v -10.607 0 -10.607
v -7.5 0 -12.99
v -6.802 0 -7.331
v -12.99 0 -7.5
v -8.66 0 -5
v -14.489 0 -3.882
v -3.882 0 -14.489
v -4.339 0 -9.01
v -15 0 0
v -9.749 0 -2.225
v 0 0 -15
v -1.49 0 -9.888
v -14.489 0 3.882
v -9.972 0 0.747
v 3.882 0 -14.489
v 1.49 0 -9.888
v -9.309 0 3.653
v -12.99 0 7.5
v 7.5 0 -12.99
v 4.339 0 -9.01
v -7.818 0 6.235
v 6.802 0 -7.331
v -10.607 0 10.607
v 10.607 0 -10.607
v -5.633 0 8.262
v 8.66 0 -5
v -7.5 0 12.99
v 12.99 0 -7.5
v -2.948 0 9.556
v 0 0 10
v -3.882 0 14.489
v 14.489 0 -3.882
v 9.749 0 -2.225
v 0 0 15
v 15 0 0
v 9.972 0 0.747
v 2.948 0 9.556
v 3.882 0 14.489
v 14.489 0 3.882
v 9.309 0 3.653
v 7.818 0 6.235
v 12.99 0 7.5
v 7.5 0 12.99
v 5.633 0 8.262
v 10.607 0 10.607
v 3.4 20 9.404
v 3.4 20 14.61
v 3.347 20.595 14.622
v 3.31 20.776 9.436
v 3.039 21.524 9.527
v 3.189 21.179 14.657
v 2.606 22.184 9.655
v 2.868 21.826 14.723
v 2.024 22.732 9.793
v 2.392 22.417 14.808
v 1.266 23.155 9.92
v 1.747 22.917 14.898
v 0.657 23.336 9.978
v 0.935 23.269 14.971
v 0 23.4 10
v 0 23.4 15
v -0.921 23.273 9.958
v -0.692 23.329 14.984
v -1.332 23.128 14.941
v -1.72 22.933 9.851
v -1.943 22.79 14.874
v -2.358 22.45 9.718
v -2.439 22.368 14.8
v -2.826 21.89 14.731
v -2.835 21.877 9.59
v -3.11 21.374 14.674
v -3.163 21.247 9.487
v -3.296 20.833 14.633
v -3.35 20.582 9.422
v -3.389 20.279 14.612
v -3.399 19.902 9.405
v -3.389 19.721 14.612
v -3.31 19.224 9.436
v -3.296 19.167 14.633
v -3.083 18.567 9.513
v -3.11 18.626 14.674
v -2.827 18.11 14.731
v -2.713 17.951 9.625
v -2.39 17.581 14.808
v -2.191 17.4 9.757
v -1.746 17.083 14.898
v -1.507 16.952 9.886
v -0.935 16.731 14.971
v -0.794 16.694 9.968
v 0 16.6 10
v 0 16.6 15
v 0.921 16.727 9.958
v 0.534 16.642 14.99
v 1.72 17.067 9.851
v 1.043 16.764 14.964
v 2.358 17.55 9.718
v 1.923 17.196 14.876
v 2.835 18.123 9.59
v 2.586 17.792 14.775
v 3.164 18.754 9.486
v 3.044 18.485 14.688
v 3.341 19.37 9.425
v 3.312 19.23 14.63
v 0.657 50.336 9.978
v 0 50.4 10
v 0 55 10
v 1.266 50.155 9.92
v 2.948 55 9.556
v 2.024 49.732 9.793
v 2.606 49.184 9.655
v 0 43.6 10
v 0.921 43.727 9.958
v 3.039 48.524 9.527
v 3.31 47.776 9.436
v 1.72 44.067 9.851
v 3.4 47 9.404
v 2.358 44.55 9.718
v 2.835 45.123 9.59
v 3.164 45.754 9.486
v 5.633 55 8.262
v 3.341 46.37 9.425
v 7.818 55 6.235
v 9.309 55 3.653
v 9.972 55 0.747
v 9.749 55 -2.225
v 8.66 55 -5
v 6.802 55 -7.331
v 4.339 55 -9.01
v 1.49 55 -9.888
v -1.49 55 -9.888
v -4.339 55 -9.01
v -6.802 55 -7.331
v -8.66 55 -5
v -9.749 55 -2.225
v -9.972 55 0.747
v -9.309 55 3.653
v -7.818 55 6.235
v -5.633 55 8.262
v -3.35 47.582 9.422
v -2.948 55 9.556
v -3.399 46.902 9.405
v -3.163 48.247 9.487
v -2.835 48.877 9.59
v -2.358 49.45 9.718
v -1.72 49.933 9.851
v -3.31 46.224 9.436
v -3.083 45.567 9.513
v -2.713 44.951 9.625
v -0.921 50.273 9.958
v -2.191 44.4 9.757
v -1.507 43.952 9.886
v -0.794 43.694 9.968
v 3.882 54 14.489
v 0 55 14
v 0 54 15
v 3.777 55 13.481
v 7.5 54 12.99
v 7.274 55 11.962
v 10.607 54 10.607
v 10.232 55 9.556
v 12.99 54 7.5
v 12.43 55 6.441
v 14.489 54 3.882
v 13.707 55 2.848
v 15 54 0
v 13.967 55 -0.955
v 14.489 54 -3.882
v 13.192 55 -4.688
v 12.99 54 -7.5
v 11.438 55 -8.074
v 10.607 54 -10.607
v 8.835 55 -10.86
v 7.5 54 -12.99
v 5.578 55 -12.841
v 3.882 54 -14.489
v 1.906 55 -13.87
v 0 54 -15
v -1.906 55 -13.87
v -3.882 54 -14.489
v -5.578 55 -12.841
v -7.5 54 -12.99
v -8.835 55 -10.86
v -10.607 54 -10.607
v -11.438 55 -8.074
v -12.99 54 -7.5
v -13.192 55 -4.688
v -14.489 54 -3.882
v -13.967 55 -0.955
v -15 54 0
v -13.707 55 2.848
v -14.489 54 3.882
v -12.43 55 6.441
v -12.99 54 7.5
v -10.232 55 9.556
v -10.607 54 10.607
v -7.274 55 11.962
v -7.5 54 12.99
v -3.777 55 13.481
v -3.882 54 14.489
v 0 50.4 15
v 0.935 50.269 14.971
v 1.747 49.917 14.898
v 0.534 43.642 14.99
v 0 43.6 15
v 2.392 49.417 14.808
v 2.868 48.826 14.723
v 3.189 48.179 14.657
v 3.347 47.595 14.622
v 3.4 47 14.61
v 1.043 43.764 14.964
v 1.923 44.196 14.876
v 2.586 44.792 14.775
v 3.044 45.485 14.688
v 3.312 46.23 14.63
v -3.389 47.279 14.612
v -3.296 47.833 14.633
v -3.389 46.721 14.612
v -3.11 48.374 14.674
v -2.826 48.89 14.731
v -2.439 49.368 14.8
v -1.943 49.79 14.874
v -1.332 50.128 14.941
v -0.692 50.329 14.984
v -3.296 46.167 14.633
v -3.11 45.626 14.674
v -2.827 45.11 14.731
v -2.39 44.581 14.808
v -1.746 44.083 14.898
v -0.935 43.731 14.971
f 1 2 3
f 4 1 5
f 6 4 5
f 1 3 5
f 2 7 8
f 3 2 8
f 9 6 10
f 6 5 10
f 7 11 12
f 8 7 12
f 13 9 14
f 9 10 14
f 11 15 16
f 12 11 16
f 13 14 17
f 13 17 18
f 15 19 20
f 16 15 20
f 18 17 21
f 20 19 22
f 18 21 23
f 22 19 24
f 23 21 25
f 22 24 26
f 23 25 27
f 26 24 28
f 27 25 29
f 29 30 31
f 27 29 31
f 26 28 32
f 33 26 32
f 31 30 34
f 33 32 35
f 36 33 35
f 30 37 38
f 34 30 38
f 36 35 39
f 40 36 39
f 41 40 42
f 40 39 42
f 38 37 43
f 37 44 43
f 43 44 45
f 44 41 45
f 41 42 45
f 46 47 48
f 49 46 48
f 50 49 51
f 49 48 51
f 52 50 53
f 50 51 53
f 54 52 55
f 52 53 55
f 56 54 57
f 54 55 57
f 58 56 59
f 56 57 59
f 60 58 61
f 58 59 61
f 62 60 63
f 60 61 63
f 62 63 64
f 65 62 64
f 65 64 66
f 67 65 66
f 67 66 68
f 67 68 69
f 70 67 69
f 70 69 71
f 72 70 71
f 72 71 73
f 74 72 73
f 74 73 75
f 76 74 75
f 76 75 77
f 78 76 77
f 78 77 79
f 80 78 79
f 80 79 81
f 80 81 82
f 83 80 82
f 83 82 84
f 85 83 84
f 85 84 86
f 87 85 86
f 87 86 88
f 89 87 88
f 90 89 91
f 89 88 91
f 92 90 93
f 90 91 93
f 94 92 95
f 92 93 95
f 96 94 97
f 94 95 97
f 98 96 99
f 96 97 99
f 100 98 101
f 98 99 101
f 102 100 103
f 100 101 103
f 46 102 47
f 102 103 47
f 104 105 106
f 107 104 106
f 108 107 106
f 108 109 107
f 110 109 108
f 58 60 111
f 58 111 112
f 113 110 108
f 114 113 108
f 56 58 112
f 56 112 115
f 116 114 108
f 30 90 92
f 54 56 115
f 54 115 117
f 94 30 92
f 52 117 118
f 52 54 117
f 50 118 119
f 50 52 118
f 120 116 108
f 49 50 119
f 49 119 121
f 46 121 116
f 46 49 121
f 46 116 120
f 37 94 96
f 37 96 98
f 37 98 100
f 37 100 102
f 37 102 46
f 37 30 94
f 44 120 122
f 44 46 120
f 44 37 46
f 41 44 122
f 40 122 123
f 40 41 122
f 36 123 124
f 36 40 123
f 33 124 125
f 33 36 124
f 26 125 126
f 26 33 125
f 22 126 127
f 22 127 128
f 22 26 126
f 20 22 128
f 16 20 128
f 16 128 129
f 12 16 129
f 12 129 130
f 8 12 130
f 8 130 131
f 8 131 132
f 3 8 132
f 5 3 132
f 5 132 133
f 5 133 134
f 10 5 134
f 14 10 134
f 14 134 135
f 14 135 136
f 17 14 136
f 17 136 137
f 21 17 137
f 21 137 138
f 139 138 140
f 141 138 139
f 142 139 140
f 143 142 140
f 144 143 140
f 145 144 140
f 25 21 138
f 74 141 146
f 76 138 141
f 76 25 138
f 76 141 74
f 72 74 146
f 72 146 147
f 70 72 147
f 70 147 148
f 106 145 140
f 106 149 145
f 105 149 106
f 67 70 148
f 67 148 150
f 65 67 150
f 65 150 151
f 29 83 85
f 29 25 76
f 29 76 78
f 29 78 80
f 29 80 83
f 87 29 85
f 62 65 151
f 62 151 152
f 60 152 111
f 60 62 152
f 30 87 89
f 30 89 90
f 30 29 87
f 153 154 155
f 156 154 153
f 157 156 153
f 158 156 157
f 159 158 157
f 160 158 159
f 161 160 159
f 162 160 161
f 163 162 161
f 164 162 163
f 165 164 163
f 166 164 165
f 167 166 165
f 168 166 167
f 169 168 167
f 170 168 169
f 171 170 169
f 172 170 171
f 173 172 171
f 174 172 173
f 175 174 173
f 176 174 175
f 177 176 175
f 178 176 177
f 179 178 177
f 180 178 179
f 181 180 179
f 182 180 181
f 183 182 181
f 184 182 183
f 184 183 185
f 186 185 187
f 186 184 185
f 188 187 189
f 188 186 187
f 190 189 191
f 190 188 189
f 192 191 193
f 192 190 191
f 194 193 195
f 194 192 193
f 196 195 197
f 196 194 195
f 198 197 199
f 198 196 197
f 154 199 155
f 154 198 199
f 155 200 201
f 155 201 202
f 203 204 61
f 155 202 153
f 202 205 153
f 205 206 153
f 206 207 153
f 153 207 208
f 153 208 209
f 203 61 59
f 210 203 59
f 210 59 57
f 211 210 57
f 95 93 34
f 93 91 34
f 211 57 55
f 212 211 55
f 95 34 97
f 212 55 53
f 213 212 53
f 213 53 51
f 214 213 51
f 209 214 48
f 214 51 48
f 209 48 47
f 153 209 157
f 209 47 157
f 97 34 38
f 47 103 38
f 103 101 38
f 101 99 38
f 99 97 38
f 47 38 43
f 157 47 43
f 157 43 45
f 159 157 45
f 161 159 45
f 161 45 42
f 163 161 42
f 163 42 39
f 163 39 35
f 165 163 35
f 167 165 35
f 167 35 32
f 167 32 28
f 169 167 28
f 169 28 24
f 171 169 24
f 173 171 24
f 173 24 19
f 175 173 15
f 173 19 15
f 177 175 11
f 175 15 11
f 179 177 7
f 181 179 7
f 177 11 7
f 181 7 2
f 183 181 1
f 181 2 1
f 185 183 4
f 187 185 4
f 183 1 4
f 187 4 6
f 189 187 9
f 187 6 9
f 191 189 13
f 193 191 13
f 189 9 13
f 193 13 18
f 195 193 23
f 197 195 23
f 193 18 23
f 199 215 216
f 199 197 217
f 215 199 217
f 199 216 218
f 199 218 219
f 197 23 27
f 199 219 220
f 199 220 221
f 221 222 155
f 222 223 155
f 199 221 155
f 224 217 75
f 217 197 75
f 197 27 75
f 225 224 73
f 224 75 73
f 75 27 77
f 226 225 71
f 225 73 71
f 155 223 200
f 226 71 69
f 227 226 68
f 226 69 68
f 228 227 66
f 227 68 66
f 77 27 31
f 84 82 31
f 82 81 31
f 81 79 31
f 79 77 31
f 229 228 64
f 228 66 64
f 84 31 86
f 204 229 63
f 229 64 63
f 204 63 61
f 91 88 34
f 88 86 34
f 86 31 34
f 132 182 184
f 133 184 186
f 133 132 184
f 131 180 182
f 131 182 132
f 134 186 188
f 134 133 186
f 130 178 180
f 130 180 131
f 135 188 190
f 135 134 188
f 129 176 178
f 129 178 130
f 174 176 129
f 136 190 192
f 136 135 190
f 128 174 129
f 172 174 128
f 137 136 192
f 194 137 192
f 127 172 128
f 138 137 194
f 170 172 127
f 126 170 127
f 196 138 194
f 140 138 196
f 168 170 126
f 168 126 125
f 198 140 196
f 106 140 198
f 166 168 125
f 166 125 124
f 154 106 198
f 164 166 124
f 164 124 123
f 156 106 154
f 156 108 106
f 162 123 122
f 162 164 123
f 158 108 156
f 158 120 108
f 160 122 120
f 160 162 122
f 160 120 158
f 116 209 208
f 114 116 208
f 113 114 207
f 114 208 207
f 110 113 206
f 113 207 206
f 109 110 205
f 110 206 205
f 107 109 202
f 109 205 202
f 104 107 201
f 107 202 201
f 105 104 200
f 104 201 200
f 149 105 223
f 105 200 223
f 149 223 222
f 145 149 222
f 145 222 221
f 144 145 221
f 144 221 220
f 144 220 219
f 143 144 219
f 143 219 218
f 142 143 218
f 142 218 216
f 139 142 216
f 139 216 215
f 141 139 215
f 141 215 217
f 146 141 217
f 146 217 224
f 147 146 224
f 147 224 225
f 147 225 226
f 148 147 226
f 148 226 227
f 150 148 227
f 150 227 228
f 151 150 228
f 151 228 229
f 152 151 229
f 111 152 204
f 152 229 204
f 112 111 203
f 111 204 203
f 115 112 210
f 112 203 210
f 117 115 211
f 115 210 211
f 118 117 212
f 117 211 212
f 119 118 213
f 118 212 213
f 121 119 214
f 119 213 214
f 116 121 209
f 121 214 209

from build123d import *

# Parameters (mm, degrees)
SKETCH1_R              = 15
SKETCH1_R_2            = 10
BOSS_EXTRUDE1_DEPTH    = 55
M8_TAPPED_HOLE1_REACH  = 66.42
M8_TAPPED_HOLE1_BORE_R = 3.4
CHAMFER1_SIZE          = 1


with BuildPart() as part:
    # Sketch1 → Boss-Extrude1 (new body)
    with BuildSketch(Plane(origin=(0, 0, 0), x_dir=(1, 0, 0), z_dir=(0, 1, 0))):
        with Locations(Location((0, 0, 0), (0, 0, 270))):
            Circle(SKETCH1_R)
        with Locations(Location((0, 0, 0), (0, 0, 270))):
            Circle(SKETCH1_R_2, mode=Mode.SUBTRACT)
    extrude(amount=BOSS_EXTRUDE1_DEPTH)

    # M8 Tapped Hole1 bore → M8 Tapped Hole1 (cut, up to next)
    with BuildSketch(Plane.XY.offset(15), mode=Mode.PRIVATE) as m8_tapped_hole1_sk1:
        with Locations((0, 47)):
            Circle(M8_TAPPED_HOLE1_BORE_R)
    m8_tapped_hole1_tool1 = extrude(m8_tapped_hole1_sk1.sketch, amount=-M8_TAPPED_HOLE1_REACH, mode=Mode.PRIVATE) & part.part
    # M8 Tapped Hole1 bore → M8 Tapped Hole1 (cut, up to next)
    with BuildSketch(Plane.XY.offset(15), mode=Mode.PRIVATE) as m8_tapped_hole1_sk2:
        with Locations((0, 20)):
            Circle(M8_TAPPED_HOLE1_BORE_R)
    m8_tapped_hole1_tool2 = extrude(m8_tapped_hole1_sk2.sketch, amount=-M8_TAPPED_HOLE1_REACH, mode=Mode.PRIVATE) & part.part
    add(m8_tapped_hole1_tool1.solids().sort_by_distance((0, 47, 15))[0], mode=Mode.SUBTRACT)
    add(m8_tapped_hole1_tool2.solids().sort_by_distance((0, 20, 15))[0], mode=Mode.SUBTRACT)

    # Chamfer1
    chamfer1_edges = [part.edges().sort_by_distance(p)[0] for p in [
        (0, 55, -15),
    ]]
    chamfer(chamfer1_edges, length=CHAMFER1_SIZE)


solid = part.part
